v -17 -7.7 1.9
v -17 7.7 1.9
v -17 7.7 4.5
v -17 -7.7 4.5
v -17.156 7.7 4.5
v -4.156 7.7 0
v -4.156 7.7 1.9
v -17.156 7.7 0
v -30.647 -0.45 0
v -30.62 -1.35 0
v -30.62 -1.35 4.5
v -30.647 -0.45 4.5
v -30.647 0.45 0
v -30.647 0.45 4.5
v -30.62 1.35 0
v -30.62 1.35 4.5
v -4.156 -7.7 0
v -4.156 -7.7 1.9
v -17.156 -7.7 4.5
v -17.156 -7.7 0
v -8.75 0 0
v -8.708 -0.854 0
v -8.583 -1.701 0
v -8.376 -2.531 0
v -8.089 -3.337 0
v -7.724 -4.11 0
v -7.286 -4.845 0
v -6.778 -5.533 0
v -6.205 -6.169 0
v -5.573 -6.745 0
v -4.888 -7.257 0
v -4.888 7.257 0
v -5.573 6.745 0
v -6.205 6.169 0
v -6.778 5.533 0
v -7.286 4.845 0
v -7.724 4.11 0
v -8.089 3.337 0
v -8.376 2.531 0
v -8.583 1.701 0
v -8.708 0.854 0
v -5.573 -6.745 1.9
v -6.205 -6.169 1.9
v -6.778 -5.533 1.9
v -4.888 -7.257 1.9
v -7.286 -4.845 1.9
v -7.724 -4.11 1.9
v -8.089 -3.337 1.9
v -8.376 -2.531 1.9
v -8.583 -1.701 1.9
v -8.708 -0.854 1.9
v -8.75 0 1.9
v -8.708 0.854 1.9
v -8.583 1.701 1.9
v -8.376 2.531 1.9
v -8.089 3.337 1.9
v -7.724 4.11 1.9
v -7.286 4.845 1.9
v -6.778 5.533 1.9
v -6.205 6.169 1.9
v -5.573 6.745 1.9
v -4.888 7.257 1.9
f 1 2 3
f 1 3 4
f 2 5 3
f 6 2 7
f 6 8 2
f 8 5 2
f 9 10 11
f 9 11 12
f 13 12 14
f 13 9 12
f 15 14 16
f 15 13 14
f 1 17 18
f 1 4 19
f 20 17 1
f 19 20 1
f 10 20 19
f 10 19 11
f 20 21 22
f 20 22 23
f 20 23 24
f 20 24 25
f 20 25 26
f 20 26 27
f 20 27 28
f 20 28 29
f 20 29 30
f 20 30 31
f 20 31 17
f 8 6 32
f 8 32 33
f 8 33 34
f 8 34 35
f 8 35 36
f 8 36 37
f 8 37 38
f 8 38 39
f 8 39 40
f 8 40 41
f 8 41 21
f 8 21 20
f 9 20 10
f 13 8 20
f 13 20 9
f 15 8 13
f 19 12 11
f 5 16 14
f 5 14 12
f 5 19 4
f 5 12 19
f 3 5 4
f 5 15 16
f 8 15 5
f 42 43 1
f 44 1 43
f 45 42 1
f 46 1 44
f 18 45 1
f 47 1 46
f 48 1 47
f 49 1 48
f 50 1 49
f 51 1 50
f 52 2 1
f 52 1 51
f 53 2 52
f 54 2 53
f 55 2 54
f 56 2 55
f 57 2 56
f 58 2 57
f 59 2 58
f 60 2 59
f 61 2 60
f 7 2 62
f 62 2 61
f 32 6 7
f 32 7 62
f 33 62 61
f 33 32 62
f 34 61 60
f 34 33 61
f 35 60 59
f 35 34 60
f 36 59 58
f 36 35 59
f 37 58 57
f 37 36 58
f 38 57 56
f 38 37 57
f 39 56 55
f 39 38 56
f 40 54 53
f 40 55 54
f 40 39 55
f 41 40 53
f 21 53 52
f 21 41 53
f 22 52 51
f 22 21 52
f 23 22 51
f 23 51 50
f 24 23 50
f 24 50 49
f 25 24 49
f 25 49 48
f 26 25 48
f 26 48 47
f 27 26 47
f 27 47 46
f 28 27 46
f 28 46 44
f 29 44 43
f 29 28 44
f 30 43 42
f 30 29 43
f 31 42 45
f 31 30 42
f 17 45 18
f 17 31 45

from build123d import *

# Parameters (mm, degrees)
EXTRUDE_1_DEPTH     = 7
CUT_EXTRUDE_START   = -5.1
CUT_EXTRUDE_1_DEPTH = 5.1
CUT_EXTRUDE_START_2 = -2.5
CUT_EXTRUDE_2_DEPTH = 2.5


with BuildPart() as part:
    # Эскиз1 → Бобышка-Вытянуть1 (new body)
    with BuildSketch(Plane.XY):
        with BuildLine():
            Line((-17.15601973, -7.7), (-30.620254734, -1.35))
            ThreePointArc((-30.620254734, -1.35), (-30.65, 0), (-30.620254734, 1.35))
            Line((-30.620254734, 1.35), (-17.15601973, 7.7))
            Line((-17.15601973, 7.7), (-4.15601973, 7.7))
            ThreePointArc((-4.15601973, 7.7), (-8.75, 0), (-4.15601973, -7.7))
            Line((-4.15601973, -7.7), (-17.15601973, -7.7))
        make_face()
    extrude(amount=EXTRUDE_1_DEPTH)

    # Эскиз2 → Вырез-Вытянуть1 (cut)
    with BuildSketch(Plane.XY.offset(7).offset(CUT_EXTRUDE_START)):
        with BuildLine():
            Line((-4.15601973, 7.7), (-17, 7.7))
            Line((-17, 7.7), (-17, -7.7))
            Line((-17, -7.7), (-4.15601973, -7.7))
            ThreePointArc((-4.15601973, -7.7), (-8.75, 0), (-4.15601973, 7.7))
        make_face()
    extrude(amount=CUT_EXTRUDE_1_DEPTH, mode=Mode.SUBTRACT)

    # Эскиз2<5> → Вырез-Вытянуть2 (cut)
    with BuildSketch(Plane.XY.offset(7).offset(CUT_EXTRUDE_START_2)):
        with BuildLine():
            Line((-17, -7.7), (-17, 7.7))
            Line((-17, 7.7), (-17.15601973, 7.7))
            Line((-17.15601973, 7.7), (-30.620254734, 1.35))
            ThreePointArc((-30.620254734, 1.35), (-30.65, 0), (-30.620254734, -1.35))
            Line((-30.620254734, -1.35), (-17.15601973, -7.7))
            Line((-17.15601973, -7.7), (-17, -7.7))
        make_face()
    extrude(amount=CUT_EXTRUDE_2_DEPTH, mode=Mode.SUBTRACT)


solid = part.part
